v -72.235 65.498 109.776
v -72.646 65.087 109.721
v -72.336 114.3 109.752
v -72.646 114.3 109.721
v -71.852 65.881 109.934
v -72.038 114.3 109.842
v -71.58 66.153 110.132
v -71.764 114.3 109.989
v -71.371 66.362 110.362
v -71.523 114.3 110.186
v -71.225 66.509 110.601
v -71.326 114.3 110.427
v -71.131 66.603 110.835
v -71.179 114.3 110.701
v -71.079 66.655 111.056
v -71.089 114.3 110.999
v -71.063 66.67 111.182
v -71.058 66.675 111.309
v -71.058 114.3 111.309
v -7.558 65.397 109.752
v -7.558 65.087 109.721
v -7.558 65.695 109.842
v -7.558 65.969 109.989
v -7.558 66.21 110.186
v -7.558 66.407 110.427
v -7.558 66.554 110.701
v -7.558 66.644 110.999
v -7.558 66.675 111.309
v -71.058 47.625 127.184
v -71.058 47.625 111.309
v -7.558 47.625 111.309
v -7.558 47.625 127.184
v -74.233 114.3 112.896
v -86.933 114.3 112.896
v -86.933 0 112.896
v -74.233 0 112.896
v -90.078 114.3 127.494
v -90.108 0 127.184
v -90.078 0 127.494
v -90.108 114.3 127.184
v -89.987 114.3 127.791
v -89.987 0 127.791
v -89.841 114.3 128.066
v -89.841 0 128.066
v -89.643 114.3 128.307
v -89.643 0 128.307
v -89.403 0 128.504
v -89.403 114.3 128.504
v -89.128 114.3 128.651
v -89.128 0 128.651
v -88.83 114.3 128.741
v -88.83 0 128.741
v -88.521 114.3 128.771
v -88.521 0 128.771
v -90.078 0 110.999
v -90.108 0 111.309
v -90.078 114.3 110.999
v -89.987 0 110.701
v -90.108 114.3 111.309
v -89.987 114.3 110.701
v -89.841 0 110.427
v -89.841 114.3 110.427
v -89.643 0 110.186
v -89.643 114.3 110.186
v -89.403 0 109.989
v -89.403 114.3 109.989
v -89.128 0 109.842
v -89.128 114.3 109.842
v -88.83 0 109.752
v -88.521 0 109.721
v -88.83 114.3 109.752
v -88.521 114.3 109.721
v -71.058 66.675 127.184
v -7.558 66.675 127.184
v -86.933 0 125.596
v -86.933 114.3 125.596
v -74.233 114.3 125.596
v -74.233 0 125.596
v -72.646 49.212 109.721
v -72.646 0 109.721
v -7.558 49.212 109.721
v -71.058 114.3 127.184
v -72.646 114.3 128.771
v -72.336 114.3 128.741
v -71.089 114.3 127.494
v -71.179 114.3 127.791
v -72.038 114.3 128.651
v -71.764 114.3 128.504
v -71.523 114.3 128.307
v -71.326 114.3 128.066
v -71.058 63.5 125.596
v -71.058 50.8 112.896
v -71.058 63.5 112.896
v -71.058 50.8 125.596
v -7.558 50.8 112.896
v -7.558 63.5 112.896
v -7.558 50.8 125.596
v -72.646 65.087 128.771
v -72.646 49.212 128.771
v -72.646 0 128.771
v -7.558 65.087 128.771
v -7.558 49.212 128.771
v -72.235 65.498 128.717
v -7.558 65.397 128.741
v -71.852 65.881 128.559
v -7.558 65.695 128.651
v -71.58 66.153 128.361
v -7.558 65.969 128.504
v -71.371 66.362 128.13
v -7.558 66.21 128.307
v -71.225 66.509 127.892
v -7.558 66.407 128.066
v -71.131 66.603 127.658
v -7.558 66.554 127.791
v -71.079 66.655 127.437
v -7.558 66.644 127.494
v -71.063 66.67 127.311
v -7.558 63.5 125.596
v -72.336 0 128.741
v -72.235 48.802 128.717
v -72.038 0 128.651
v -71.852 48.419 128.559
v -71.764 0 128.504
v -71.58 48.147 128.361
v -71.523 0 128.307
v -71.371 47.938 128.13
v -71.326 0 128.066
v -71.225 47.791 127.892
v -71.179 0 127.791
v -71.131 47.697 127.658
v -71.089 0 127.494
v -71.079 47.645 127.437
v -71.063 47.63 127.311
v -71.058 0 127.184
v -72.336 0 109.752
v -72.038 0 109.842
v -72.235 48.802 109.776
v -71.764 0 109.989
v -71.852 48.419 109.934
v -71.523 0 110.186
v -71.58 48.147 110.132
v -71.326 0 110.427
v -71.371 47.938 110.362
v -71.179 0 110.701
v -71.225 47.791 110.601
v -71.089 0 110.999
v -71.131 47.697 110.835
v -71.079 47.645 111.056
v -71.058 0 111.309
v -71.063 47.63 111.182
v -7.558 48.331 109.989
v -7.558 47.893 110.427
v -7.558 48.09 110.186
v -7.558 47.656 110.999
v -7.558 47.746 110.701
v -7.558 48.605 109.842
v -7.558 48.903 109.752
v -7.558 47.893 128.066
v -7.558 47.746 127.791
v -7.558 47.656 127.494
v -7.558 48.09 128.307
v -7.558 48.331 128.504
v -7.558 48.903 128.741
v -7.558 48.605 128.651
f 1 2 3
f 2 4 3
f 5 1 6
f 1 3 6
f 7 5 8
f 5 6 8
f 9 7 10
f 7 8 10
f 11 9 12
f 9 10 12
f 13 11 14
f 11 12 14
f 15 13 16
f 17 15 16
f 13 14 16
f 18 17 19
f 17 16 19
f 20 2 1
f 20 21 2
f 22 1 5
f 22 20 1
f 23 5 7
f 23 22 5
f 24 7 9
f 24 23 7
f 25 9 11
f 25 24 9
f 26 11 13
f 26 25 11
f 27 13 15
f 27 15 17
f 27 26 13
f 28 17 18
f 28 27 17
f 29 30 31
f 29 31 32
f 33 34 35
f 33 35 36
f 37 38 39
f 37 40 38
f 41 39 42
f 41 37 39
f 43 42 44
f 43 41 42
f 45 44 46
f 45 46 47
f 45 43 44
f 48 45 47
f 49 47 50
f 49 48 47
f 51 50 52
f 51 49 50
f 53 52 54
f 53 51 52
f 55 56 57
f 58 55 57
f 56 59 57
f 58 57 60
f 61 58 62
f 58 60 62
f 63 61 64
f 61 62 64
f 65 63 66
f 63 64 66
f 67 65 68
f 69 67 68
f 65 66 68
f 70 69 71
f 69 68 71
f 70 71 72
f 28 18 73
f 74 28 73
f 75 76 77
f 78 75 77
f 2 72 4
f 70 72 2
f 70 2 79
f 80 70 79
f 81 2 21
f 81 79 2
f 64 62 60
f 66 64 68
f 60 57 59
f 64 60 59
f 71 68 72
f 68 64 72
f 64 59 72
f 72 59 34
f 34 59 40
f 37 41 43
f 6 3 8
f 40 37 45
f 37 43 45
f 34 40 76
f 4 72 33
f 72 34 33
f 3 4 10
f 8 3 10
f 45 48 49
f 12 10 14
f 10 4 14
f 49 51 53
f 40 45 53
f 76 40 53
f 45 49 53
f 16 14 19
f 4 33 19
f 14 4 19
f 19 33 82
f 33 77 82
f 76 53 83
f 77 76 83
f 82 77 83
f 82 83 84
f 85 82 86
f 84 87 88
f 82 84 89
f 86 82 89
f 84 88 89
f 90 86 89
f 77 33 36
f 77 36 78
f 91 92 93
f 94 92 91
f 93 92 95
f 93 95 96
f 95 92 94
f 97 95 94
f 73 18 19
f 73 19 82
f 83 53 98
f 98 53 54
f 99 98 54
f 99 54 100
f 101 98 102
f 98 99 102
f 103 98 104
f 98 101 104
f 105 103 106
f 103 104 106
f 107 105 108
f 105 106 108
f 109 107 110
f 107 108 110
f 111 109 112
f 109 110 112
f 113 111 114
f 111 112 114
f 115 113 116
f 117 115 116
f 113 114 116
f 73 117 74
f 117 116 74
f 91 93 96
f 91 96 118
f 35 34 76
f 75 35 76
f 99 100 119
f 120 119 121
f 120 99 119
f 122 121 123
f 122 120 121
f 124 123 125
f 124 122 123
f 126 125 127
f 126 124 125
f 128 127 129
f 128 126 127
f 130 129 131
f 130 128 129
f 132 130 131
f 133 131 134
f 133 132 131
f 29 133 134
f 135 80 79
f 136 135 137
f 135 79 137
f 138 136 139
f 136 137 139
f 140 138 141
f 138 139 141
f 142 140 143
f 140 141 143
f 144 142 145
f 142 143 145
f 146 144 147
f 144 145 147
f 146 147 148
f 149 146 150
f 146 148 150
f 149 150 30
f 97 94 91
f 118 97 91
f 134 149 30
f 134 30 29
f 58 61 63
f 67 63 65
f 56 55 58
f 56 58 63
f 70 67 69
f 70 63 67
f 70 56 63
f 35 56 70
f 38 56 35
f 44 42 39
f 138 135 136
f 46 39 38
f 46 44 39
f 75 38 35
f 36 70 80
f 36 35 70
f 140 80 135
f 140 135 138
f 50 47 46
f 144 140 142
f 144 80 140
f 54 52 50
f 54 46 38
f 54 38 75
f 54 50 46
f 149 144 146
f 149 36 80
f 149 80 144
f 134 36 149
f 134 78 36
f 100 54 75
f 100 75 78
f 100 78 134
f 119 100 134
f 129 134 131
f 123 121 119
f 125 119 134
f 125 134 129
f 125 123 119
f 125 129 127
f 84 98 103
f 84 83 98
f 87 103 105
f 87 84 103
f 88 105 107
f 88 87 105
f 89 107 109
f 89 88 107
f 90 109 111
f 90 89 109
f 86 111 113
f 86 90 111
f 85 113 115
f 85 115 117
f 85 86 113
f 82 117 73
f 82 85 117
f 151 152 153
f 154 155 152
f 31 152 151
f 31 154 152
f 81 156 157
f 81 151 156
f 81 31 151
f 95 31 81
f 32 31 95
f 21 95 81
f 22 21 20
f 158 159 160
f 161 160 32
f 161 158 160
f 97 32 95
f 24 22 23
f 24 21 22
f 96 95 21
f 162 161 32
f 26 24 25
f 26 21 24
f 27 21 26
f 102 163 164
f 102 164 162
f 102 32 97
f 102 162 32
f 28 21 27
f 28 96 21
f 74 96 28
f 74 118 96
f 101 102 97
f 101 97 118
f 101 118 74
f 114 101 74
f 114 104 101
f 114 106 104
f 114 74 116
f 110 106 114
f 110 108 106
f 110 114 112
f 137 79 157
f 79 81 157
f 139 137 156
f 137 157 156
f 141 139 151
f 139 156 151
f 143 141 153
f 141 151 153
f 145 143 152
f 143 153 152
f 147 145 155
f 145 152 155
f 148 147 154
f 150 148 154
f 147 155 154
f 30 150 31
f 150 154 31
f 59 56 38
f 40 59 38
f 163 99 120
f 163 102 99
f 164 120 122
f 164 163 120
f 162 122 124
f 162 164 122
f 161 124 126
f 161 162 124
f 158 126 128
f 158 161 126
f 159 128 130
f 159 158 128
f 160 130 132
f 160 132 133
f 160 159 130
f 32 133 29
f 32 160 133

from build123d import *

# Parameters (mm, degrees)
F0_W     = 19.05
F0_H     = 19.05
F0_W_2   = 12.7
F0_H_2   = 12.7
F1_DEPTH = 114.3
F2_W     = 19.05
F2_H     = 19.05
F2_W_2   = 12.7
F2_H_2   = 12.7
F3_DEPTH = 63.5
F4_R     = 1.5875


with BuildPart() as f1:
    # F0 (on Front) → F1 (new body)
    with BuildSketch(Plane.XZ):
        with Locations((-80.5832530618, 119.2464818001)):
            Rectangle(F0_W, F0_H)
        with Locations((-80.5832530618, 119.2464818001)):
            Rectangle(F0_W_2, F0_H_2, mode=Mode.SUBTRACT)
    extrude(amount=-F1_DEPTH)

    # F2 (on face) → F3 (join)
    with BuildSketch(Plane.YZ.offset(-71.0582530618)):
        with Locations((57.15, 119.2464818001)):
            Rectangle(F2_W, F2_H)
        with Locations((57.15, 119.2464818001)):
            Rectangle(F2_W_2, F2_H_2, mode=Mode.SUBTRACT)
    extrude(amount=F3_DEPTH)

    # F4
    f4_edges = [f1.edges().sort_by_distance(p)[0] for p in [
        (-71.058253, 23.8125, 128.771482),
        (-39.308253, 47.625, 128.771482),
        (-90.108253, 57.15, 128.771482),
        (-71.058253, 23.8125, 109.721482),
        (-39.308253, 47.625, 109.721482),
        (-71.058253, 90.4875, 128.771482),
        (-71.058253, 90.4875, 109.721482),
        (-39.308253, 66.675, 109.721482),
        (-39.308253, 66.675, 128.771482),
        (-90.108253, 57.15, 109.721482),
    ]]
    fillet(f4_edges, radius=F4_R)


solid = f1.part
